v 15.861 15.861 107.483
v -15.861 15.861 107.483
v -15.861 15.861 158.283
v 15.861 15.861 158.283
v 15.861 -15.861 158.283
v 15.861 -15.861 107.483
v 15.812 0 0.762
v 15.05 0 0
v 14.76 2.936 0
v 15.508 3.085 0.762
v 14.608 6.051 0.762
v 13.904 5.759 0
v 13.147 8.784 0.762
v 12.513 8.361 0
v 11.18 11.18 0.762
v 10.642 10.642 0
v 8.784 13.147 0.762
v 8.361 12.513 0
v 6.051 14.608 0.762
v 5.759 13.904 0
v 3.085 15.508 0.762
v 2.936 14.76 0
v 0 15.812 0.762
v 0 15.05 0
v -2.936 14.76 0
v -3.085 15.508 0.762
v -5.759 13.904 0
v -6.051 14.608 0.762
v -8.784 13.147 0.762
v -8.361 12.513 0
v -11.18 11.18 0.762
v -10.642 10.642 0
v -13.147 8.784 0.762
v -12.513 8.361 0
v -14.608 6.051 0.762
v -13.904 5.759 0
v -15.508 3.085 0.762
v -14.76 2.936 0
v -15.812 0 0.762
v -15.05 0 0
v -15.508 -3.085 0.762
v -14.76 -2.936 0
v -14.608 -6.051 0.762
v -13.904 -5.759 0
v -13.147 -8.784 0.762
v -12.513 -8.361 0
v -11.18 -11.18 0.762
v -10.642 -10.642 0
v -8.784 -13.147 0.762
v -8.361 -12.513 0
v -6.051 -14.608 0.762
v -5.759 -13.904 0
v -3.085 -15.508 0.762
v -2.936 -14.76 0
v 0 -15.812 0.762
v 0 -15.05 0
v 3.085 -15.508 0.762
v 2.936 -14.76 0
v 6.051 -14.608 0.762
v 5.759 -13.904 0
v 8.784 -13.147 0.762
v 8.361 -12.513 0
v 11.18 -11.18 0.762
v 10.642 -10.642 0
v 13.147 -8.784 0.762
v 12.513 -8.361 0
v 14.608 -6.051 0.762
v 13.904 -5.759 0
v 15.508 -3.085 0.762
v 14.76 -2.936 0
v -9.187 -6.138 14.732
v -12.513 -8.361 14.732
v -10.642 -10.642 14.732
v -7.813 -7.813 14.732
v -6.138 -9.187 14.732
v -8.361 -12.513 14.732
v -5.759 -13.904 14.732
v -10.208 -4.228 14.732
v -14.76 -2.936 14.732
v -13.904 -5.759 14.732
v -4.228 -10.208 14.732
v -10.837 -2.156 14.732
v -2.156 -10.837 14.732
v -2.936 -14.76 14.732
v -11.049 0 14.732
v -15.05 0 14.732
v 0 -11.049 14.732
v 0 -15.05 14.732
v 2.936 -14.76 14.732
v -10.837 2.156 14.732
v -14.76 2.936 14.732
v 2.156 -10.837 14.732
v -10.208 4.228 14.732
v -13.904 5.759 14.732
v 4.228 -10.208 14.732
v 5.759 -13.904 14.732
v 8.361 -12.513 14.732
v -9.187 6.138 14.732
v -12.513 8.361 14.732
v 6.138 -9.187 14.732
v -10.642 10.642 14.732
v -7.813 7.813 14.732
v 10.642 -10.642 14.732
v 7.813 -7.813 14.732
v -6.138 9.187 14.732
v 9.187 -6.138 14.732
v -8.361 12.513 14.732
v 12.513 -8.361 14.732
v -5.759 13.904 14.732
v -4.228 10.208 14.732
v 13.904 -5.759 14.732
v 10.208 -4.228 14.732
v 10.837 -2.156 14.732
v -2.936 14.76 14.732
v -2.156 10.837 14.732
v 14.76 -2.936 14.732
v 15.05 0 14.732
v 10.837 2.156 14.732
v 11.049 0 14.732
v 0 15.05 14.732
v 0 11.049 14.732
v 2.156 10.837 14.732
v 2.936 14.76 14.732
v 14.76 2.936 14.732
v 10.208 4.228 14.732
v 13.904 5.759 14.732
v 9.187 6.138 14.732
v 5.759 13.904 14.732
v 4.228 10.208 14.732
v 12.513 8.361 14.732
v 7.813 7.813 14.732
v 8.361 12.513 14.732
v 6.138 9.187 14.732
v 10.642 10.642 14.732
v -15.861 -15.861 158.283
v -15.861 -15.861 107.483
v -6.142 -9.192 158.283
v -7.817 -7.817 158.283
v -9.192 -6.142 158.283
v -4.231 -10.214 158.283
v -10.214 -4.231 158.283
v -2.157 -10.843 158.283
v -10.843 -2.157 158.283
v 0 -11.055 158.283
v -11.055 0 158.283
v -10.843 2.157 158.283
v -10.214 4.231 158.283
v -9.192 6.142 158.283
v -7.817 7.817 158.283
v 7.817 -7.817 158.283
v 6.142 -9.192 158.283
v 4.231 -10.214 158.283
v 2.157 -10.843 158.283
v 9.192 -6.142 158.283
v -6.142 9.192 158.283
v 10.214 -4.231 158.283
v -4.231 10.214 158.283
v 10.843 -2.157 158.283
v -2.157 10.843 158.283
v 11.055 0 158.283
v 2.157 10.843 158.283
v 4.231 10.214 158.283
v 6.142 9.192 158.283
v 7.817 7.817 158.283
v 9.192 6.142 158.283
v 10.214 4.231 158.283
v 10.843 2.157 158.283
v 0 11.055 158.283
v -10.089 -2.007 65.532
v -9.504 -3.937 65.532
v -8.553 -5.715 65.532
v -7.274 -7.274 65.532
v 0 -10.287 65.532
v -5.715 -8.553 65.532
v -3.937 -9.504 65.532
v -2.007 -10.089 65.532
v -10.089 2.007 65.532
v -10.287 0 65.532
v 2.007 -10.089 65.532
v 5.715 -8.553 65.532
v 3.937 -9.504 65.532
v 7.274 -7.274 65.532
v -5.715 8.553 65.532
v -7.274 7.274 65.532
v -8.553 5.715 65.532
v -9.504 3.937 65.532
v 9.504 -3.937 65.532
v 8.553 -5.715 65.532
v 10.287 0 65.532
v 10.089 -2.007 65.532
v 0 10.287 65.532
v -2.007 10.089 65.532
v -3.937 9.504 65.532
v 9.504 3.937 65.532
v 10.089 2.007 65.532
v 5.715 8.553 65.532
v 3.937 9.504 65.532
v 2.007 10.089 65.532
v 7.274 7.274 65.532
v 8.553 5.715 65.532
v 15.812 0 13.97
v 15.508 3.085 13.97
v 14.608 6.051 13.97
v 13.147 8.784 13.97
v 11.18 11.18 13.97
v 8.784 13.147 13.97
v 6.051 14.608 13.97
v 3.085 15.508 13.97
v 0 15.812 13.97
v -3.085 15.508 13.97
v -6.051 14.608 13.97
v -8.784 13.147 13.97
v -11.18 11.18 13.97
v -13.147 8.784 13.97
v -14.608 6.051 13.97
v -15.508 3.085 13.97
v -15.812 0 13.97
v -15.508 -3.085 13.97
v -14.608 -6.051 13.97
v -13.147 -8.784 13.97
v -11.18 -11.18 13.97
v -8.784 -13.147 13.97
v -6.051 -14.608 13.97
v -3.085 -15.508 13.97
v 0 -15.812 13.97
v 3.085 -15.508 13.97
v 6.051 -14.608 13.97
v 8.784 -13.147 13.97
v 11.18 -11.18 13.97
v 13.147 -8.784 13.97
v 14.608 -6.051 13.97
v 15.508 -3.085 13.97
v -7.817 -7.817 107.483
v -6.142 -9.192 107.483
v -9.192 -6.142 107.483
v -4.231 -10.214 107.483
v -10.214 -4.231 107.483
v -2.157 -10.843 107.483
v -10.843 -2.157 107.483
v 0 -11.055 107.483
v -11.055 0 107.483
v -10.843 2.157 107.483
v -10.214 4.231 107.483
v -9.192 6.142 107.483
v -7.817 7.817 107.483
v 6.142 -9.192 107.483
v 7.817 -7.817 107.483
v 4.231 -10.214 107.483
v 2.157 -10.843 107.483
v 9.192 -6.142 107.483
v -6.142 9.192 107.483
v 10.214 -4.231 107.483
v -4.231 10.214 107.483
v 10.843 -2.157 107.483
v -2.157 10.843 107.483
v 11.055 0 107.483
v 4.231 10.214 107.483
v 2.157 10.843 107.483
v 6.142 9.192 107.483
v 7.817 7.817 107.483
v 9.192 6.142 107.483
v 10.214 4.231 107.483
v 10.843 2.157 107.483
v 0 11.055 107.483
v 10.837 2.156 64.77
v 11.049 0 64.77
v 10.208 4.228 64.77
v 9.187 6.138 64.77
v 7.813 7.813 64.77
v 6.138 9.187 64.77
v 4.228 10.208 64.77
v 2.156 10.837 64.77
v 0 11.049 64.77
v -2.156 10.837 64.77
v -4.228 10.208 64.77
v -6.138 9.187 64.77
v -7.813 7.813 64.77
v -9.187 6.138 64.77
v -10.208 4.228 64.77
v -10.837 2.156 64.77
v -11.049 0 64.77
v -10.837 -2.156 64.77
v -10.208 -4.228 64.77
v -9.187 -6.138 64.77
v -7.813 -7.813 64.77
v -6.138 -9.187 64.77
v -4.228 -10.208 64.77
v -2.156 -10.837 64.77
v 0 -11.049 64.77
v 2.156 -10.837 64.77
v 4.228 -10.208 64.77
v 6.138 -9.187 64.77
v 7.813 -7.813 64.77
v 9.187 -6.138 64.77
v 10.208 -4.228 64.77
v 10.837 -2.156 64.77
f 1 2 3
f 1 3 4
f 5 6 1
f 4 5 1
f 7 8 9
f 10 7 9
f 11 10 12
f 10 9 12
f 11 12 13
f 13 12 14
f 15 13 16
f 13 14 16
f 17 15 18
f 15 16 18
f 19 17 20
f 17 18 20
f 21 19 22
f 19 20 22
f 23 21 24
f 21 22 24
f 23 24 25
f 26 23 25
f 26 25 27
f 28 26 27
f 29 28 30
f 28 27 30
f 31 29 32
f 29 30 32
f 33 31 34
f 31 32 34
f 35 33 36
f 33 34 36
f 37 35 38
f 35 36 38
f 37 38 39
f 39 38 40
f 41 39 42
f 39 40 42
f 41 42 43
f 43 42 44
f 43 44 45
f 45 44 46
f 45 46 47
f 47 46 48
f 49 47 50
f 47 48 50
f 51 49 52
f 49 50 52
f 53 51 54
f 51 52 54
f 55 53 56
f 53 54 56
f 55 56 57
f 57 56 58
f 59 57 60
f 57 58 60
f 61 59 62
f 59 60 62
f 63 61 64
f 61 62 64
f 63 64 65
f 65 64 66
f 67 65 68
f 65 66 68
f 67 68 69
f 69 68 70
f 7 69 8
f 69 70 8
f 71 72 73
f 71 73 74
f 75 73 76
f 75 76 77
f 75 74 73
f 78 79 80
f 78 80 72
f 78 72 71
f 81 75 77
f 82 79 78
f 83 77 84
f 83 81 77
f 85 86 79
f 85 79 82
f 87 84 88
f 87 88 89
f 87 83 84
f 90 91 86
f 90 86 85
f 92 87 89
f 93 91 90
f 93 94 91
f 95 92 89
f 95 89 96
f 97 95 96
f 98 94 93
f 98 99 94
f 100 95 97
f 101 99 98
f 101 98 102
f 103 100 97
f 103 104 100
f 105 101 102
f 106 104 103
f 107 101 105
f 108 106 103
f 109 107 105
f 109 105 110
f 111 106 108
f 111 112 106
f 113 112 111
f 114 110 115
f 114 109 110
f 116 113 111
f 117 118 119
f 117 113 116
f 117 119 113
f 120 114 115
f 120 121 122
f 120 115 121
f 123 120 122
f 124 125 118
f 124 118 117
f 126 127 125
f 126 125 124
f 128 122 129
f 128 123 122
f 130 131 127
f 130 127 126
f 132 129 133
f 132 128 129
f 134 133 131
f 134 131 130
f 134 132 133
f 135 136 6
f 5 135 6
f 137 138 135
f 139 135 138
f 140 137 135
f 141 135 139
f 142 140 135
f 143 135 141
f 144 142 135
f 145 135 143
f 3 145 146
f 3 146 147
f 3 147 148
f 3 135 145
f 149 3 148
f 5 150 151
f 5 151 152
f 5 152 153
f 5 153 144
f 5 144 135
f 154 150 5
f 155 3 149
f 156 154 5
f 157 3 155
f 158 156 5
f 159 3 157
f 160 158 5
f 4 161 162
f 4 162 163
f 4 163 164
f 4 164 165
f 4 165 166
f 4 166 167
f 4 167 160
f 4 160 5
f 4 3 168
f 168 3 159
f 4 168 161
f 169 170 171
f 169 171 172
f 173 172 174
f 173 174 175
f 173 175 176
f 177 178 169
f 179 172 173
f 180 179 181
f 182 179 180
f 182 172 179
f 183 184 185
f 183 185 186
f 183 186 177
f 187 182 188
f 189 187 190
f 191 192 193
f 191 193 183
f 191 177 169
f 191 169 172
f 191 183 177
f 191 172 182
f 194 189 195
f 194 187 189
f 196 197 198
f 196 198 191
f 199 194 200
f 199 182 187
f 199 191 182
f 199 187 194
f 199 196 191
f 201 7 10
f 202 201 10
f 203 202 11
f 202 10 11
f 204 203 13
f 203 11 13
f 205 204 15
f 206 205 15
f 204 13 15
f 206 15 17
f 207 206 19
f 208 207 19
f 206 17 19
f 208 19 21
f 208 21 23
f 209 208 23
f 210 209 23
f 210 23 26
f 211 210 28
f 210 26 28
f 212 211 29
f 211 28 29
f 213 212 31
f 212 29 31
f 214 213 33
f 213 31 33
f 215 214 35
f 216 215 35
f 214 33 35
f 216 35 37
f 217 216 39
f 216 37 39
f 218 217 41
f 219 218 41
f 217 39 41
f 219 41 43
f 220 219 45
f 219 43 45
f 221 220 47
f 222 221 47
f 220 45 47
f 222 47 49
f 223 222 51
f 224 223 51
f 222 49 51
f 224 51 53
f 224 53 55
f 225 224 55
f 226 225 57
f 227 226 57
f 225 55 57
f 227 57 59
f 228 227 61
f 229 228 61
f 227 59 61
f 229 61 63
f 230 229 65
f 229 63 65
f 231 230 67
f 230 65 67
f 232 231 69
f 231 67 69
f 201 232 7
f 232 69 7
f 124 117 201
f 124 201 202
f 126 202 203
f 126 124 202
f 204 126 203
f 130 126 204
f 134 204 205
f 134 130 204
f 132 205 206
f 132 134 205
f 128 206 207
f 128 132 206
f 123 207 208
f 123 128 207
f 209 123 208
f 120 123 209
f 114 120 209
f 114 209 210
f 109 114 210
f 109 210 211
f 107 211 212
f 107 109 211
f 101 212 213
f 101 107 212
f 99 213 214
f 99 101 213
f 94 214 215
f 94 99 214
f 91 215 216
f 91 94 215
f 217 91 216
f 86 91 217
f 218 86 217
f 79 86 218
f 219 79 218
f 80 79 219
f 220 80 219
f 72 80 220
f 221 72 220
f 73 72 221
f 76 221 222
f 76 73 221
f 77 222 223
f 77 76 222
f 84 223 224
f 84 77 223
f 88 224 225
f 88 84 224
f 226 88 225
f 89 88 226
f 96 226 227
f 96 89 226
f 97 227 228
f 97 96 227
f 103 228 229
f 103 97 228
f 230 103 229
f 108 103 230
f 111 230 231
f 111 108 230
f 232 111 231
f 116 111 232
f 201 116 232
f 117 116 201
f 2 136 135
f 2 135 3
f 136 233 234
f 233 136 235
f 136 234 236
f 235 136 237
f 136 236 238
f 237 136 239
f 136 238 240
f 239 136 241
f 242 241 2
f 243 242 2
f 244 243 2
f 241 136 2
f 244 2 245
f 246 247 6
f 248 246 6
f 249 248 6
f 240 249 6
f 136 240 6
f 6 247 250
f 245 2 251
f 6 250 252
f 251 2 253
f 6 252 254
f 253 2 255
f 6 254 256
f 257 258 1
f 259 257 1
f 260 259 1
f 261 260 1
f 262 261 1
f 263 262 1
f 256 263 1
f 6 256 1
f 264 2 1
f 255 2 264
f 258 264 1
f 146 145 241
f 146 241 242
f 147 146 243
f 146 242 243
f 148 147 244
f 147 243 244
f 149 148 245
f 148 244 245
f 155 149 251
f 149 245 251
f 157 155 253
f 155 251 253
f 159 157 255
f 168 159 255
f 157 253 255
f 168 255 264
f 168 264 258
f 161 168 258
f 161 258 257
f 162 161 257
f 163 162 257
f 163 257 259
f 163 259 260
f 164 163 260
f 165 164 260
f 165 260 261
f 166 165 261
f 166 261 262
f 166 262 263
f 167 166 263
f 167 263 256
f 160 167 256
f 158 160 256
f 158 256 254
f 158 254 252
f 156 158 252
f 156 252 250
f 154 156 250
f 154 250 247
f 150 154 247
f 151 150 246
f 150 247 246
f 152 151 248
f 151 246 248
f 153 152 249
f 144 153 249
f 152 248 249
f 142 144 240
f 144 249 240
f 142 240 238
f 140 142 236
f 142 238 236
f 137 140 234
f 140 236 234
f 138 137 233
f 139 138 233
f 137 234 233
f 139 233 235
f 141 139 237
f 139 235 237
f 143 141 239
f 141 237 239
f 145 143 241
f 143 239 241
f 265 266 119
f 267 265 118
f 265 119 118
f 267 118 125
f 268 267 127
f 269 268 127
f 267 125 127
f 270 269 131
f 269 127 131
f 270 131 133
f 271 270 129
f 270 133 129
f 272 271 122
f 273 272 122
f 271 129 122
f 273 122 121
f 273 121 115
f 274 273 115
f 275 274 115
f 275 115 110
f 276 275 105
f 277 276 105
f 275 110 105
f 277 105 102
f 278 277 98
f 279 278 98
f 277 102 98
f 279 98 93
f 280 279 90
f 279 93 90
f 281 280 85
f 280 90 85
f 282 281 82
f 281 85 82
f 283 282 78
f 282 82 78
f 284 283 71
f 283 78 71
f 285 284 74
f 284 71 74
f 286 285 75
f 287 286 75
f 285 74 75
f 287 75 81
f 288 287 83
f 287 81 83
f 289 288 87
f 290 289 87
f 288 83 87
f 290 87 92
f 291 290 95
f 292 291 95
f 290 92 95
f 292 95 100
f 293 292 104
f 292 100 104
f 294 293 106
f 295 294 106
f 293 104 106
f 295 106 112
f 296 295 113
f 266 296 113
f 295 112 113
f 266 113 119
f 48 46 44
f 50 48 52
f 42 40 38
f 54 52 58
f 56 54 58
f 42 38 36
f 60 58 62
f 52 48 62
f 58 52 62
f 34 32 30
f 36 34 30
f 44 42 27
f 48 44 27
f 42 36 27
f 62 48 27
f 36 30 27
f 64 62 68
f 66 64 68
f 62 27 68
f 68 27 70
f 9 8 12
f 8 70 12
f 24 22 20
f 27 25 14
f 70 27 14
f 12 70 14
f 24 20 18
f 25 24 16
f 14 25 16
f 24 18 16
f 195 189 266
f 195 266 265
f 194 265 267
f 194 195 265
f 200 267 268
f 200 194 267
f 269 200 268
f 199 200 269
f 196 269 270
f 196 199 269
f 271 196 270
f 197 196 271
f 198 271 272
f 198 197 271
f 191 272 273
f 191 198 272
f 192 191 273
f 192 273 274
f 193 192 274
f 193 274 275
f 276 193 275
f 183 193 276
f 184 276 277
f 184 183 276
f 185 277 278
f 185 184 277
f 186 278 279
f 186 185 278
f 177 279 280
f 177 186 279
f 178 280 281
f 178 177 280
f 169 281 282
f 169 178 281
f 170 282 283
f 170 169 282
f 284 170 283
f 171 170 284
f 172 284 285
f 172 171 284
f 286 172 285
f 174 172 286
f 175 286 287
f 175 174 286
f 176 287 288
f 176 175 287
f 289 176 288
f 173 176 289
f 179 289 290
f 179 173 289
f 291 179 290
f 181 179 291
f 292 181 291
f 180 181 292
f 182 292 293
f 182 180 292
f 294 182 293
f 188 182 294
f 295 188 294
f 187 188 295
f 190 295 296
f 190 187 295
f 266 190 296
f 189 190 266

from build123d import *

# Parameters (mm, degrees)
SKETCH1_R           = 15.8115
BOSS_EXTRUDE1_DEPTH = 14.732
SKETCH2_R           = 11.049
BOSS_EXTRUDE2_DEPTH = 50.8
SKETCH3_W           = 31.722698392
SKETCH3_H           = 31.722698392
BOSS_EXTRUDE3_DEPTH = 50.8
SKETCH4_R           = 11.05535
CUT_EXTRUDE1_DEPTH  = 110.798996017
CHAMFER1_SIZE       = 0.762


with BuildPart() as part:
    # Sketch1 → Boss-Extrude1 (new body)
    with BuildSketch(Plane.XY):
        Circle(SKETCH1_R)
    extrude(amount=BOSS_EXTRUDE1_DEPTH)

    # Sketch2 → Boss-Extrude2 (add)
    with BuildSketch(Plane.XY.offset(14.732)):
        Circle(SKETCH2_R)
    extrude(amount=BOSS_EXTRUDE2_DEPTH)

    # Chamfer1
    chamfer1_edges = [part.edges().sort_by_distance(p)[0] for p in [
        (-15.8115, 0, 0),
        (-15.8115, 0, 14.732),
        (-11.049, 0, 65.532),
    ]]
    chamfer(chamfer1_edges, length=CHAMFER1_SIZE)


with BuildPart() as body_2:
    # Sketch3 → Boss-Extrude3 (new body)
    with BuildSketch(Plane.XY.offset(107.483276511)):
        Rectangle(SKETCH3_W, SKETCH3_H)
    extrude(amount=BOSS_EXTRUDE3_DEPTH)

    # Sketch4 → Cut-Extrude1 (cut, through all)
    with BuildSketch(Plane(origin=(0, 0, 107.483276511), x_dir=(-1, 0, 0), z_dir=(0, 0, -1))):
        Circle(SKETCH4_R)
    extrude(amount=-CUT_EXTRUDE1_DEPTH, mode=Mode.SUBTRACT)


solid = Compound([part.part, body_2.part])
